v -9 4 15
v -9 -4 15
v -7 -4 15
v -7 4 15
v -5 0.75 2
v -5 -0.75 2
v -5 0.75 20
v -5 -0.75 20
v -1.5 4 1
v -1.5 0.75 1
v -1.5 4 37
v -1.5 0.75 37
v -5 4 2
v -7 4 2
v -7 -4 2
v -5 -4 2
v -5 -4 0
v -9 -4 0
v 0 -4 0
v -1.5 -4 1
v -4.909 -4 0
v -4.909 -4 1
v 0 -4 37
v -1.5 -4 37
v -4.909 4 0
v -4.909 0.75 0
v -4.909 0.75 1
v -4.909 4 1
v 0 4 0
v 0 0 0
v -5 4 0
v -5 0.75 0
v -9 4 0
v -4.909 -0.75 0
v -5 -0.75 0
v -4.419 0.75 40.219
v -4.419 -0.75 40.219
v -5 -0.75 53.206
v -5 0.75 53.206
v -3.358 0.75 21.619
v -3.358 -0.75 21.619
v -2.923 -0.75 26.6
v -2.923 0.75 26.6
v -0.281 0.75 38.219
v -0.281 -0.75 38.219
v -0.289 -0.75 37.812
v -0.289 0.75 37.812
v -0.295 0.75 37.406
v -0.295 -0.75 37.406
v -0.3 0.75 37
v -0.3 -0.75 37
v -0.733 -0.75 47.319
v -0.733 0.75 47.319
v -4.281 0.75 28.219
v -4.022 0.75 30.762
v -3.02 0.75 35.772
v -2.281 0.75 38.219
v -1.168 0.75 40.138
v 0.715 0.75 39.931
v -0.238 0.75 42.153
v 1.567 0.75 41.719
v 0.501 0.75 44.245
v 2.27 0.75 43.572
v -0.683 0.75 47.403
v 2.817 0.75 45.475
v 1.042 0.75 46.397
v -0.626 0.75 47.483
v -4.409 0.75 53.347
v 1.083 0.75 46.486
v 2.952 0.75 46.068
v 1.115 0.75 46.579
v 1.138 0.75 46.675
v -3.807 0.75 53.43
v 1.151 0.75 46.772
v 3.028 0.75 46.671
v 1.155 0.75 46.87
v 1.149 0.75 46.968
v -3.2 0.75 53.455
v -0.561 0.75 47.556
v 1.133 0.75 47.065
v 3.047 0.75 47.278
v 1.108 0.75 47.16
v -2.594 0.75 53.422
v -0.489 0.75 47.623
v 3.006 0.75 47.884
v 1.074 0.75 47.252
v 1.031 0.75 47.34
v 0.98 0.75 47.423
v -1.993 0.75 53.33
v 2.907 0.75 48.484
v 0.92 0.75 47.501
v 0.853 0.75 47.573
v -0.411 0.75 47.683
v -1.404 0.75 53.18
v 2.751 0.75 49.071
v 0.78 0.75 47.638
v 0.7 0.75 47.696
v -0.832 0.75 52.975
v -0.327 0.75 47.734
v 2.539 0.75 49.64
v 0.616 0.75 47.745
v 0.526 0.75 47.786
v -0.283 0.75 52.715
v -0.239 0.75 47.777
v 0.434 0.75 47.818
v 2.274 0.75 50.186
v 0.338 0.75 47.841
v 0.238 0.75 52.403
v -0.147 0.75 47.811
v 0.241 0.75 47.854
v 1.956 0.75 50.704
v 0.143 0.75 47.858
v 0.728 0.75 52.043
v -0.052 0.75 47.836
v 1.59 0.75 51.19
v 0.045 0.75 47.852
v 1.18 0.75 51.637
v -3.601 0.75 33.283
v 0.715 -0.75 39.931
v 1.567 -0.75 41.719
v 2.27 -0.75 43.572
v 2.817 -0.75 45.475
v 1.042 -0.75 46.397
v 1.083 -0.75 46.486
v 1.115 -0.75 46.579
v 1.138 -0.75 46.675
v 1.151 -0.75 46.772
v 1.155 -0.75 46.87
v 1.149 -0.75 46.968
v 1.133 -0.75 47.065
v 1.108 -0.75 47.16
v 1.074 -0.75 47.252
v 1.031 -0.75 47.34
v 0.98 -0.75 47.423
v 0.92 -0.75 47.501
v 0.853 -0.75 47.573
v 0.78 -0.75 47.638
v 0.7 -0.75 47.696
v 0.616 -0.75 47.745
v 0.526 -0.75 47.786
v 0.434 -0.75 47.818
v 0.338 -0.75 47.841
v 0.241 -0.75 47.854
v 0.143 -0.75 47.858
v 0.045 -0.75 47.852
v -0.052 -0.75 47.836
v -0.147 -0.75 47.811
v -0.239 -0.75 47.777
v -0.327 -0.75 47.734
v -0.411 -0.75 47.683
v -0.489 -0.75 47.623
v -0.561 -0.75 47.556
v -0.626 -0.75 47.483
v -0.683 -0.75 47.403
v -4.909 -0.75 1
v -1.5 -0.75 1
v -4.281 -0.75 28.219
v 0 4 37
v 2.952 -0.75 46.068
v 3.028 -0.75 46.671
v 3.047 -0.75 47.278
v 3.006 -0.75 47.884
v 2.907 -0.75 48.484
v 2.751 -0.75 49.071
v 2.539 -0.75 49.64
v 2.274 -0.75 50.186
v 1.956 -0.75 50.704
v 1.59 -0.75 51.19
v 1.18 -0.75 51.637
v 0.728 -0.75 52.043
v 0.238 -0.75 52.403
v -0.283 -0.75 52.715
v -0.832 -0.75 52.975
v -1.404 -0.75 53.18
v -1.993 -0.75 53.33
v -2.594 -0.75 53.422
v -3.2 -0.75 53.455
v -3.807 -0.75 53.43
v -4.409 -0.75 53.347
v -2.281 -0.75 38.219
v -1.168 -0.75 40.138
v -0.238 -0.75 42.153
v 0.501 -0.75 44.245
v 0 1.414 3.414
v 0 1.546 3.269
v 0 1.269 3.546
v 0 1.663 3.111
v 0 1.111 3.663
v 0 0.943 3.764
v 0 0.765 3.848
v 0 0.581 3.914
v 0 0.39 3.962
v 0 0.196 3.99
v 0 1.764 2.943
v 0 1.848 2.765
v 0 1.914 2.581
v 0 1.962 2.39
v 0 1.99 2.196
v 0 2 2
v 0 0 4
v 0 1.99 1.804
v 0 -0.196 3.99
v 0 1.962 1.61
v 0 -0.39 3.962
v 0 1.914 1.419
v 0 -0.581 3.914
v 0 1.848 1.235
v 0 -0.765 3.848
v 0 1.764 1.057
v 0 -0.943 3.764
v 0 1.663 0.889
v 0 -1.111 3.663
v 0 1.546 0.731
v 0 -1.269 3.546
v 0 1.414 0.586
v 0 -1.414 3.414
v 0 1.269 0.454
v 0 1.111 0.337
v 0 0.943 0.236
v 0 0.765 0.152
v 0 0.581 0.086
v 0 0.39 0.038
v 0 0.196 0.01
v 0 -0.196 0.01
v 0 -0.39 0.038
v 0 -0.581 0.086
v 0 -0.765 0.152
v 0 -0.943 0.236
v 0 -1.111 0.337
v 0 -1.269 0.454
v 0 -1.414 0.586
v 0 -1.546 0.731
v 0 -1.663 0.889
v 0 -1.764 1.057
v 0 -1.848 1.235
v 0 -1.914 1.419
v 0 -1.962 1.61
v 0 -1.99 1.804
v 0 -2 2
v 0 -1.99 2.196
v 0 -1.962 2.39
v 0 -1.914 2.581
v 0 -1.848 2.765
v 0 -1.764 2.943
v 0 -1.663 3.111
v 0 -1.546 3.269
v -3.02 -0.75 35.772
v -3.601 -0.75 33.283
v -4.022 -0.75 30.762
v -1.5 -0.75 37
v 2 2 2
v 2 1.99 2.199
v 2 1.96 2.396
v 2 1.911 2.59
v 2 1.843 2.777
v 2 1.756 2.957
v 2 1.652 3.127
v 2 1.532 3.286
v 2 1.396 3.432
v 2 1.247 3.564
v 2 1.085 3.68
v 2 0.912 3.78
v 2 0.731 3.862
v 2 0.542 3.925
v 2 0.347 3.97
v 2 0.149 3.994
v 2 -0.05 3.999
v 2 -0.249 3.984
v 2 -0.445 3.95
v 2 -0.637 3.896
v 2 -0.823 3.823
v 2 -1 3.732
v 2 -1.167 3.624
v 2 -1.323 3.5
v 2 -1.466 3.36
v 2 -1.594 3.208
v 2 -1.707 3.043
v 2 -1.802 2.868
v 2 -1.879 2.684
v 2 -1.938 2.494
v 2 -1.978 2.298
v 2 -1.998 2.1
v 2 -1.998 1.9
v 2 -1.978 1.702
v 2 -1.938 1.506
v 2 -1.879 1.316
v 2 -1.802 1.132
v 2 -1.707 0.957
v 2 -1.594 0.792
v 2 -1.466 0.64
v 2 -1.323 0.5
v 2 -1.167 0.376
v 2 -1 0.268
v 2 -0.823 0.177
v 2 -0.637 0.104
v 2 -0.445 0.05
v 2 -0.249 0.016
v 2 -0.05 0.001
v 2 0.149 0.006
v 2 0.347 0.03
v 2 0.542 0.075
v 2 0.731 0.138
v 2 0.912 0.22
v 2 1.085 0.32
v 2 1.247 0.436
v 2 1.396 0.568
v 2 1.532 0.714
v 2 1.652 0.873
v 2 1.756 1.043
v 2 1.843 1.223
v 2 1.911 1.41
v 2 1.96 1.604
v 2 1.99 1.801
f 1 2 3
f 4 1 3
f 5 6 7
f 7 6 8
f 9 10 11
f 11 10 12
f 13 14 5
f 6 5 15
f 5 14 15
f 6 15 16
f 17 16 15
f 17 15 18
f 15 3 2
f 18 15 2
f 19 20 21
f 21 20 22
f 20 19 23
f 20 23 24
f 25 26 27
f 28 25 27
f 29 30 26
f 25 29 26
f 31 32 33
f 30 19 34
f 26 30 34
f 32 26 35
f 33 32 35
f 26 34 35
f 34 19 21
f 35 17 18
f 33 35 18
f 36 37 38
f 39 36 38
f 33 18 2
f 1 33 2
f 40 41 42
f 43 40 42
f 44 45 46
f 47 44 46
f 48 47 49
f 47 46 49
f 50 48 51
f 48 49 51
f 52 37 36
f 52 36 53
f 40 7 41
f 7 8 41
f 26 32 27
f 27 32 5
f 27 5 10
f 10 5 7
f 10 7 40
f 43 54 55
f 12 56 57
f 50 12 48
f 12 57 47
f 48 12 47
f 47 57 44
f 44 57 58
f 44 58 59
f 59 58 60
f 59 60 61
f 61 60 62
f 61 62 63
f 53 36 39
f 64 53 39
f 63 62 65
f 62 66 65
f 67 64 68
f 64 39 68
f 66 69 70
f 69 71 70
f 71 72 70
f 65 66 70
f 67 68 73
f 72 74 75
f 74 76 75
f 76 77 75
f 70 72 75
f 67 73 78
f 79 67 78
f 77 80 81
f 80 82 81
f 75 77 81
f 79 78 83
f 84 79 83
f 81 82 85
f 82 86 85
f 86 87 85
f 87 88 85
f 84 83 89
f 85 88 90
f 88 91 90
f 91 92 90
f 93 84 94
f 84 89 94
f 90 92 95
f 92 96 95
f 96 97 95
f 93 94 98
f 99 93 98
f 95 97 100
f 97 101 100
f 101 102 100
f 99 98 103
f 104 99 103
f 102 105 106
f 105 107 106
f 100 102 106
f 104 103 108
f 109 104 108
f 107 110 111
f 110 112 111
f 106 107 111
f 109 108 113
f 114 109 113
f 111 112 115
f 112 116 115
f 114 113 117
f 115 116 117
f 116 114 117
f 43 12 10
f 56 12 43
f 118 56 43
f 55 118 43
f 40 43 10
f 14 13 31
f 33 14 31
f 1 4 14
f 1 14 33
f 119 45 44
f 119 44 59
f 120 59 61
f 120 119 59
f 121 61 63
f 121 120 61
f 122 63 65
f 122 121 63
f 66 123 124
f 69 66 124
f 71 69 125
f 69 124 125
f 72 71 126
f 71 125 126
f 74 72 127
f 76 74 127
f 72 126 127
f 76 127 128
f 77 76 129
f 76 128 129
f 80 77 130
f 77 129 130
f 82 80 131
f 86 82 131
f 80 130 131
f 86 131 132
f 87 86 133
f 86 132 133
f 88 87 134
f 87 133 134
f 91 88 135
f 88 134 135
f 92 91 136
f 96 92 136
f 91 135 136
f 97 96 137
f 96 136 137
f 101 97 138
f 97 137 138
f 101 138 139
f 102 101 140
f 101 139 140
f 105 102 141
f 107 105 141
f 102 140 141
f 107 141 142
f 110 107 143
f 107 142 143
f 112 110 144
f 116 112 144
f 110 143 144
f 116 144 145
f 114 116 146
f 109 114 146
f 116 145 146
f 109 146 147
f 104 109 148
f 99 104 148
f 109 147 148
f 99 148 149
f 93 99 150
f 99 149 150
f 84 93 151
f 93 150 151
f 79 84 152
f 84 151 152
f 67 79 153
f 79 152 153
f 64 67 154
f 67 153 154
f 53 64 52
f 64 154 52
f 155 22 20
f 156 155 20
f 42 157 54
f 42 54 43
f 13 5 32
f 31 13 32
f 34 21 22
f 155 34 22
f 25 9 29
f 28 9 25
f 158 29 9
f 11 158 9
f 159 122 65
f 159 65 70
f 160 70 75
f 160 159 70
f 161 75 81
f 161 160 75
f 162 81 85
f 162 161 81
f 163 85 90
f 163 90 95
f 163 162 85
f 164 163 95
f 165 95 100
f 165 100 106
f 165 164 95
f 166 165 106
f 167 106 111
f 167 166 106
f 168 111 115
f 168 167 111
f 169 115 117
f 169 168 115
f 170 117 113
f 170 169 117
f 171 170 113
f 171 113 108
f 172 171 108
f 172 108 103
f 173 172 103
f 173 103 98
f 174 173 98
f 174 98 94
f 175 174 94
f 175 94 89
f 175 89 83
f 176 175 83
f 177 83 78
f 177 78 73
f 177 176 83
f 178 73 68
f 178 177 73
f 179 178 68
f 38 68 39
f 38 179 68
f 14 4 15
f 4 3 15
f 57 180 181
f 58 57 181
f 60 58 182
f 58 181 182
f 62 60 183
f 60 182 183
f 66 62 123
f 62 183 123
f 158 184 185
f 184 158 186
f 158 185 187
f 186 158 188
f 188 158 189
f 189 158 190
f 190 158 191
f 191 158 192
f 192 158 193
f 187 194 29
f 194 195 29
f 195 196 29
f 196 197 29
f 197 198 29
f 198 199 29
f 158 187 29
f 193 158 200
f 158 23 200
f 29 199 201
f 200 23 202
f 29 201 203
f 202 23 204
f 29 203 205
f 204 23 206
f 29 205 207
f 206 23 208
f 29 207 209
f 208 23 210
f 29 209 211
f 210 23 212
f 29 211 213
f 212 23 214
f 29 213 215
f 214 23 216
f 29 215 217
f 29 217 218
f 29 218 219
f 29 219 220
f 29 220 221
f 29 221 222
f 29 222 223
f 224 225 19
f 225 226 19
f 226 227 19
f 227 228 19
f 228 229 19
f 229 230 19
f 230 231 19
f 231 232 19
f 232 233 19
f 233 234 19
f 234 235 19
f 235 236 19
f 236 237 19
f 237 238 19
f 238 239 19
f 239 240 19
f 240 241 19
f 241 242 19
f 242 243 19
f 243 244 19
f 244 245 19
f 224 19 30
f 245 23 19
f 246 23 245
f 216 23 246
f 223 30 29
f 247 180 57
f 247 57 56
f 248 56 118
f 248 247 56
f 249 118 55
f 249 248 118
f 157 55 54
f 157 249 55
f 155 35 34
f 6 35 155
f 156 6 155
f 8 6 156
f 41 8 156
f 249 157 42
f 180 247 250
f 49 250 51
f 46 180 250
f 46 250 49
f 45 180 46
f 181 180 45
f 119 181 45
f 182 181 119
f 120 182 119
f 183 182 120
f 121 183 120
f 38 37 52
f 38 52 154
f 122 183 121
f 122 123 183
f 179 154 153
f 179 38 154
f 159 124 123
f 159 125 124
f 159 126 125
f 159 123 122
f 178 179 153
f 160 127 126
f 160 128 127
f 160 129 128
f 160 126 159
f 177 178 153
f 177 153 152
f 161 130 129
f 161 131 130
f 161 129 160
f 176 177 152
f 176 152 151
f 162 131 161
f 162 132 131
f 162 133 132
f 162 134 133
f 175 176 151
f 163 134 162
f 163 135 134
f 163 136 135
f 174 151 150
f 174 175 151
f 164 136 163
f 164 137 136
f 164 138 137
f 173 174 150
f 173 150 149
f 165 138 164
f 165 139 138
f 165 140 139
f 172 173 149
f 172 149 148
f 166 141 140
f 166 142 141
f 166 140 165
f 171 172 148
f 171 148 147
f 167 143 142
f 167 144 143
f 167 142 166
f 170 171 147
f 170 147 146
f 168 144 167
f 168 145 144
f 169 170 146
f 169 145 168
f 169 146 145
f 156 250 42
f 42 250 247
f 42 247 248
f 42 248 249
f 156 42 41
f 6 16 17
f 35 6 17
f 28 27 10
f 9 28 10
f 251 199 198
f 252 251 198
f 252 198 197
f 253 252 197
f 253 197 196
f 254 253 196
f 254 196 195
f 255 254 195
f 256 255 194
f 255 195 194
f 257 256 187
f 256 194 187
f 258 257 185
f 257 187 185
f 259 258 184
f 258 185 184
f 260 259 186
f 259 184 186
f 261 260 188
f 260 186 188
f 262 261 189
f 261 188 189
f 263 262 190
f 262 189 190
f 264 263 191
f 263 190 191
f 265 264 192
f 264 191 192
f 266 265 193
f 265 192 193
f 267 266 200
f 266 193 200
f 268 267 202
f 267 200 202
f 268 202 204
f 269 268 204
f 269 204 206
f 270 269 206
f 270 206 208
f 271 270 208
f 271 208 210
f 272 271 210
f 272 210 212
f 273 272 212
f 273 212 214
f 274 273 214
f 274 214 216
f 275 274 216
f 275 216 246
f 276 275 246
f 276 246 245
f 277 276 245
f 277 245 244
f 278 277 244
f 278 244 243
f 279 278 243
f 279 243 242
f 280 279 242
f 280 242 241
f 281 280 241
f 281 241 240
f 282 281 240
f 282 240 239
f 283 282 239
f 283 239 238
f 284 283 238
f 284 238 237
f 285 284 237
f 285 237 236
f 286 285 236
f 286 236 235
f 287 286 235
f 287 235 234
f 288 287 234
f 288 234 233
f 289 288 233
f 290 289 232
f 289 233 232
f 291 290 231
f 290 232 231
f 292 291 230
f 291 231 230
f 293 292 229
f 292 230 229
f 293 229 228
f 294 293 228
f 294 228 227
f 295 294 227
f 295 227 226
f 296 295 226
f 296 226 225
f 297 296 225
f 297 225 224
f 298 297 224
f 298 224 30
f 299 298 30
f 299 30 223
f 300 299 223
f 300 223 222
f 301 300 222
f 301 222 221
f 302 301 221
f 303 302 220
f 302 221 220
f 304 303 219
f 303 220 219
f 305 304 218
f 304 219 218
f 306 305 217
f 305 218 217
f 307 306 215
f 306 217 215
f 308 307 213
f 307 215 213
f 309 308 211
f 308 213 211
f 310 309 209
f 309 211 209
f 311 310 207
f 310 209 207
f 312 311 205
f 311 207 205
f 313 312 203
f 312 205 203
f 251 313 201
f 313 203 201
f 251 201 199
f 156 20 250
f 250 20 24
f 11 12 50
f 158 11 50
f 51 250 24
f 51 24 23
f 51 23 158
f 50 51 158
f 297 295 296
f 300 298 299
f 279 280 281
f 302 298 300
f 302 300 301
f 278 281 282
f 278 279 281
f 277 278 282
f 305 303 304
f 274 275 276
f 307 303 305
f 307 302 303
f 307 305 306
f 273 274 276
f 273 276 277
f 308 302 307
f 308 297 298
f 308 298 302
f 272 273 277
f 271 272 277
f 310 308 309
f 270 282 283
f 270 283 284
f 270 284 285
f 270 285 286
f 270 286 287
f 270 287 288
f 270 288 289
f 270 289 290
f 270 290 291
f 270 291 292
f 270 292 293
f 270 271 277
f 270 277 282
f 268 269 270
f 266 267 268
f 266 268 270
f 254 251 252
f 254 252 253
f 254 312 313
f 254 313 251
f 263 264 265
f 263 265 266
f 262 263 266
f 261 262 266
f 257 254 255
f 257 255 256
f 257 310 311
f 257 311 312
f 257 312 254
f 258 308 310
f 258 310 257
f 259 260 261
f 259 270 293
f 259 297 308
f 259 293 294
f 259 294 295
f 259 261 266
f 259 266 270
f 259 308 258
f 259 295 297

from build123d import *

# Parameters (mm, degrees)
PAD003_DEPTH = 4
SKETCH002_R  = 2
PAD004_DEPTH = 2
PAD005_DEPTH = 4
PAD_DEPTH    = 0.75


with BuildPart() as pad003:
    # Sketch003 → Pad003 (new body, symmetric)
    with BuildSketch(Plane.XZ):
        Polygon((-9, 15), (-7, 15), (-7, 2), (-5, 2), (-5, 0), (-9, 0), align=None)
    extrude(amount=PAD003_DEPTH, both=True)


with BuildPart() as pad004:
    # Sketch002 → Pad004 (new body)
    with BuildSketch(Plane.YZ):
        with Locations((0, 2)):
            Circle(SKETCH002_R)
    extrude(amount=PAD004_DEPTH)


with BuildPart() as pad005:
    # Sketch → Pad005 (new body, symmetric)
    with BuildSketch(Plane.XZ):
        Polygon((-1.5, 37), (0, 37), (0, 0), (-4.908648, 0), (-4.908648, 1), (-1.5, 1), align=None)
    extrude(amount=PAD005_DEPTH, both=True)


with BuildPart() as fusion:
    # Sketch001 → Pad (new body, symmetric)
    with BuildSketch(Plane.XZ):
        with BuildLine():
            Line((0, 0), (0, 28.218657))
            ThreePointArc((-0.280961, 38.218657), (-0.265608, 33.215142), (0, 28.218657))
            ThreePointArc((-0.280961, 38.218657), (1.567466, 41.71926), (2.817294, 45.475433))
            ThreePointArc((2.817294, 45.475433), (1.179618, 51.6371), (-5, 53.205675))
            Line((-4.419163, 40.218657), (-5, 53.205675))
            Line((-4.419163, 40.218657), (-0.732708, 47.318661))
            ThreePointArc((1.042293, 46.397047), (0.615603, 47.745362), (-0.732708, 47.318661))
            ThreePointArc((-2.280961, 38.218657), (-0.238148, 42.152959), (1.042293, 46.397047))
            ThreePointArc((-2.280961, 38.218657), (-3.600955, 33.282656), (-4.280961, 28.218657))
            Line((-4.280961, 28.218657), (-2.922591, 26.599815))
            Line((-3.35837, 21.618842), (-2.922591, 26.599815))
            Line((-5, 20), (-3.35837, 21.618842))
            Line((-5, 0), (-5, 20))
            Line((0, 0), (-5, 0))
        make_face()
    extrude(amount=PAD_DEPTH, both=True)

    # Fusion: union Pad003, Pad004, Pad005
    add(pad003.part)
    add(pad004.part)
    add(pad005.part)


solid = fusion.part
